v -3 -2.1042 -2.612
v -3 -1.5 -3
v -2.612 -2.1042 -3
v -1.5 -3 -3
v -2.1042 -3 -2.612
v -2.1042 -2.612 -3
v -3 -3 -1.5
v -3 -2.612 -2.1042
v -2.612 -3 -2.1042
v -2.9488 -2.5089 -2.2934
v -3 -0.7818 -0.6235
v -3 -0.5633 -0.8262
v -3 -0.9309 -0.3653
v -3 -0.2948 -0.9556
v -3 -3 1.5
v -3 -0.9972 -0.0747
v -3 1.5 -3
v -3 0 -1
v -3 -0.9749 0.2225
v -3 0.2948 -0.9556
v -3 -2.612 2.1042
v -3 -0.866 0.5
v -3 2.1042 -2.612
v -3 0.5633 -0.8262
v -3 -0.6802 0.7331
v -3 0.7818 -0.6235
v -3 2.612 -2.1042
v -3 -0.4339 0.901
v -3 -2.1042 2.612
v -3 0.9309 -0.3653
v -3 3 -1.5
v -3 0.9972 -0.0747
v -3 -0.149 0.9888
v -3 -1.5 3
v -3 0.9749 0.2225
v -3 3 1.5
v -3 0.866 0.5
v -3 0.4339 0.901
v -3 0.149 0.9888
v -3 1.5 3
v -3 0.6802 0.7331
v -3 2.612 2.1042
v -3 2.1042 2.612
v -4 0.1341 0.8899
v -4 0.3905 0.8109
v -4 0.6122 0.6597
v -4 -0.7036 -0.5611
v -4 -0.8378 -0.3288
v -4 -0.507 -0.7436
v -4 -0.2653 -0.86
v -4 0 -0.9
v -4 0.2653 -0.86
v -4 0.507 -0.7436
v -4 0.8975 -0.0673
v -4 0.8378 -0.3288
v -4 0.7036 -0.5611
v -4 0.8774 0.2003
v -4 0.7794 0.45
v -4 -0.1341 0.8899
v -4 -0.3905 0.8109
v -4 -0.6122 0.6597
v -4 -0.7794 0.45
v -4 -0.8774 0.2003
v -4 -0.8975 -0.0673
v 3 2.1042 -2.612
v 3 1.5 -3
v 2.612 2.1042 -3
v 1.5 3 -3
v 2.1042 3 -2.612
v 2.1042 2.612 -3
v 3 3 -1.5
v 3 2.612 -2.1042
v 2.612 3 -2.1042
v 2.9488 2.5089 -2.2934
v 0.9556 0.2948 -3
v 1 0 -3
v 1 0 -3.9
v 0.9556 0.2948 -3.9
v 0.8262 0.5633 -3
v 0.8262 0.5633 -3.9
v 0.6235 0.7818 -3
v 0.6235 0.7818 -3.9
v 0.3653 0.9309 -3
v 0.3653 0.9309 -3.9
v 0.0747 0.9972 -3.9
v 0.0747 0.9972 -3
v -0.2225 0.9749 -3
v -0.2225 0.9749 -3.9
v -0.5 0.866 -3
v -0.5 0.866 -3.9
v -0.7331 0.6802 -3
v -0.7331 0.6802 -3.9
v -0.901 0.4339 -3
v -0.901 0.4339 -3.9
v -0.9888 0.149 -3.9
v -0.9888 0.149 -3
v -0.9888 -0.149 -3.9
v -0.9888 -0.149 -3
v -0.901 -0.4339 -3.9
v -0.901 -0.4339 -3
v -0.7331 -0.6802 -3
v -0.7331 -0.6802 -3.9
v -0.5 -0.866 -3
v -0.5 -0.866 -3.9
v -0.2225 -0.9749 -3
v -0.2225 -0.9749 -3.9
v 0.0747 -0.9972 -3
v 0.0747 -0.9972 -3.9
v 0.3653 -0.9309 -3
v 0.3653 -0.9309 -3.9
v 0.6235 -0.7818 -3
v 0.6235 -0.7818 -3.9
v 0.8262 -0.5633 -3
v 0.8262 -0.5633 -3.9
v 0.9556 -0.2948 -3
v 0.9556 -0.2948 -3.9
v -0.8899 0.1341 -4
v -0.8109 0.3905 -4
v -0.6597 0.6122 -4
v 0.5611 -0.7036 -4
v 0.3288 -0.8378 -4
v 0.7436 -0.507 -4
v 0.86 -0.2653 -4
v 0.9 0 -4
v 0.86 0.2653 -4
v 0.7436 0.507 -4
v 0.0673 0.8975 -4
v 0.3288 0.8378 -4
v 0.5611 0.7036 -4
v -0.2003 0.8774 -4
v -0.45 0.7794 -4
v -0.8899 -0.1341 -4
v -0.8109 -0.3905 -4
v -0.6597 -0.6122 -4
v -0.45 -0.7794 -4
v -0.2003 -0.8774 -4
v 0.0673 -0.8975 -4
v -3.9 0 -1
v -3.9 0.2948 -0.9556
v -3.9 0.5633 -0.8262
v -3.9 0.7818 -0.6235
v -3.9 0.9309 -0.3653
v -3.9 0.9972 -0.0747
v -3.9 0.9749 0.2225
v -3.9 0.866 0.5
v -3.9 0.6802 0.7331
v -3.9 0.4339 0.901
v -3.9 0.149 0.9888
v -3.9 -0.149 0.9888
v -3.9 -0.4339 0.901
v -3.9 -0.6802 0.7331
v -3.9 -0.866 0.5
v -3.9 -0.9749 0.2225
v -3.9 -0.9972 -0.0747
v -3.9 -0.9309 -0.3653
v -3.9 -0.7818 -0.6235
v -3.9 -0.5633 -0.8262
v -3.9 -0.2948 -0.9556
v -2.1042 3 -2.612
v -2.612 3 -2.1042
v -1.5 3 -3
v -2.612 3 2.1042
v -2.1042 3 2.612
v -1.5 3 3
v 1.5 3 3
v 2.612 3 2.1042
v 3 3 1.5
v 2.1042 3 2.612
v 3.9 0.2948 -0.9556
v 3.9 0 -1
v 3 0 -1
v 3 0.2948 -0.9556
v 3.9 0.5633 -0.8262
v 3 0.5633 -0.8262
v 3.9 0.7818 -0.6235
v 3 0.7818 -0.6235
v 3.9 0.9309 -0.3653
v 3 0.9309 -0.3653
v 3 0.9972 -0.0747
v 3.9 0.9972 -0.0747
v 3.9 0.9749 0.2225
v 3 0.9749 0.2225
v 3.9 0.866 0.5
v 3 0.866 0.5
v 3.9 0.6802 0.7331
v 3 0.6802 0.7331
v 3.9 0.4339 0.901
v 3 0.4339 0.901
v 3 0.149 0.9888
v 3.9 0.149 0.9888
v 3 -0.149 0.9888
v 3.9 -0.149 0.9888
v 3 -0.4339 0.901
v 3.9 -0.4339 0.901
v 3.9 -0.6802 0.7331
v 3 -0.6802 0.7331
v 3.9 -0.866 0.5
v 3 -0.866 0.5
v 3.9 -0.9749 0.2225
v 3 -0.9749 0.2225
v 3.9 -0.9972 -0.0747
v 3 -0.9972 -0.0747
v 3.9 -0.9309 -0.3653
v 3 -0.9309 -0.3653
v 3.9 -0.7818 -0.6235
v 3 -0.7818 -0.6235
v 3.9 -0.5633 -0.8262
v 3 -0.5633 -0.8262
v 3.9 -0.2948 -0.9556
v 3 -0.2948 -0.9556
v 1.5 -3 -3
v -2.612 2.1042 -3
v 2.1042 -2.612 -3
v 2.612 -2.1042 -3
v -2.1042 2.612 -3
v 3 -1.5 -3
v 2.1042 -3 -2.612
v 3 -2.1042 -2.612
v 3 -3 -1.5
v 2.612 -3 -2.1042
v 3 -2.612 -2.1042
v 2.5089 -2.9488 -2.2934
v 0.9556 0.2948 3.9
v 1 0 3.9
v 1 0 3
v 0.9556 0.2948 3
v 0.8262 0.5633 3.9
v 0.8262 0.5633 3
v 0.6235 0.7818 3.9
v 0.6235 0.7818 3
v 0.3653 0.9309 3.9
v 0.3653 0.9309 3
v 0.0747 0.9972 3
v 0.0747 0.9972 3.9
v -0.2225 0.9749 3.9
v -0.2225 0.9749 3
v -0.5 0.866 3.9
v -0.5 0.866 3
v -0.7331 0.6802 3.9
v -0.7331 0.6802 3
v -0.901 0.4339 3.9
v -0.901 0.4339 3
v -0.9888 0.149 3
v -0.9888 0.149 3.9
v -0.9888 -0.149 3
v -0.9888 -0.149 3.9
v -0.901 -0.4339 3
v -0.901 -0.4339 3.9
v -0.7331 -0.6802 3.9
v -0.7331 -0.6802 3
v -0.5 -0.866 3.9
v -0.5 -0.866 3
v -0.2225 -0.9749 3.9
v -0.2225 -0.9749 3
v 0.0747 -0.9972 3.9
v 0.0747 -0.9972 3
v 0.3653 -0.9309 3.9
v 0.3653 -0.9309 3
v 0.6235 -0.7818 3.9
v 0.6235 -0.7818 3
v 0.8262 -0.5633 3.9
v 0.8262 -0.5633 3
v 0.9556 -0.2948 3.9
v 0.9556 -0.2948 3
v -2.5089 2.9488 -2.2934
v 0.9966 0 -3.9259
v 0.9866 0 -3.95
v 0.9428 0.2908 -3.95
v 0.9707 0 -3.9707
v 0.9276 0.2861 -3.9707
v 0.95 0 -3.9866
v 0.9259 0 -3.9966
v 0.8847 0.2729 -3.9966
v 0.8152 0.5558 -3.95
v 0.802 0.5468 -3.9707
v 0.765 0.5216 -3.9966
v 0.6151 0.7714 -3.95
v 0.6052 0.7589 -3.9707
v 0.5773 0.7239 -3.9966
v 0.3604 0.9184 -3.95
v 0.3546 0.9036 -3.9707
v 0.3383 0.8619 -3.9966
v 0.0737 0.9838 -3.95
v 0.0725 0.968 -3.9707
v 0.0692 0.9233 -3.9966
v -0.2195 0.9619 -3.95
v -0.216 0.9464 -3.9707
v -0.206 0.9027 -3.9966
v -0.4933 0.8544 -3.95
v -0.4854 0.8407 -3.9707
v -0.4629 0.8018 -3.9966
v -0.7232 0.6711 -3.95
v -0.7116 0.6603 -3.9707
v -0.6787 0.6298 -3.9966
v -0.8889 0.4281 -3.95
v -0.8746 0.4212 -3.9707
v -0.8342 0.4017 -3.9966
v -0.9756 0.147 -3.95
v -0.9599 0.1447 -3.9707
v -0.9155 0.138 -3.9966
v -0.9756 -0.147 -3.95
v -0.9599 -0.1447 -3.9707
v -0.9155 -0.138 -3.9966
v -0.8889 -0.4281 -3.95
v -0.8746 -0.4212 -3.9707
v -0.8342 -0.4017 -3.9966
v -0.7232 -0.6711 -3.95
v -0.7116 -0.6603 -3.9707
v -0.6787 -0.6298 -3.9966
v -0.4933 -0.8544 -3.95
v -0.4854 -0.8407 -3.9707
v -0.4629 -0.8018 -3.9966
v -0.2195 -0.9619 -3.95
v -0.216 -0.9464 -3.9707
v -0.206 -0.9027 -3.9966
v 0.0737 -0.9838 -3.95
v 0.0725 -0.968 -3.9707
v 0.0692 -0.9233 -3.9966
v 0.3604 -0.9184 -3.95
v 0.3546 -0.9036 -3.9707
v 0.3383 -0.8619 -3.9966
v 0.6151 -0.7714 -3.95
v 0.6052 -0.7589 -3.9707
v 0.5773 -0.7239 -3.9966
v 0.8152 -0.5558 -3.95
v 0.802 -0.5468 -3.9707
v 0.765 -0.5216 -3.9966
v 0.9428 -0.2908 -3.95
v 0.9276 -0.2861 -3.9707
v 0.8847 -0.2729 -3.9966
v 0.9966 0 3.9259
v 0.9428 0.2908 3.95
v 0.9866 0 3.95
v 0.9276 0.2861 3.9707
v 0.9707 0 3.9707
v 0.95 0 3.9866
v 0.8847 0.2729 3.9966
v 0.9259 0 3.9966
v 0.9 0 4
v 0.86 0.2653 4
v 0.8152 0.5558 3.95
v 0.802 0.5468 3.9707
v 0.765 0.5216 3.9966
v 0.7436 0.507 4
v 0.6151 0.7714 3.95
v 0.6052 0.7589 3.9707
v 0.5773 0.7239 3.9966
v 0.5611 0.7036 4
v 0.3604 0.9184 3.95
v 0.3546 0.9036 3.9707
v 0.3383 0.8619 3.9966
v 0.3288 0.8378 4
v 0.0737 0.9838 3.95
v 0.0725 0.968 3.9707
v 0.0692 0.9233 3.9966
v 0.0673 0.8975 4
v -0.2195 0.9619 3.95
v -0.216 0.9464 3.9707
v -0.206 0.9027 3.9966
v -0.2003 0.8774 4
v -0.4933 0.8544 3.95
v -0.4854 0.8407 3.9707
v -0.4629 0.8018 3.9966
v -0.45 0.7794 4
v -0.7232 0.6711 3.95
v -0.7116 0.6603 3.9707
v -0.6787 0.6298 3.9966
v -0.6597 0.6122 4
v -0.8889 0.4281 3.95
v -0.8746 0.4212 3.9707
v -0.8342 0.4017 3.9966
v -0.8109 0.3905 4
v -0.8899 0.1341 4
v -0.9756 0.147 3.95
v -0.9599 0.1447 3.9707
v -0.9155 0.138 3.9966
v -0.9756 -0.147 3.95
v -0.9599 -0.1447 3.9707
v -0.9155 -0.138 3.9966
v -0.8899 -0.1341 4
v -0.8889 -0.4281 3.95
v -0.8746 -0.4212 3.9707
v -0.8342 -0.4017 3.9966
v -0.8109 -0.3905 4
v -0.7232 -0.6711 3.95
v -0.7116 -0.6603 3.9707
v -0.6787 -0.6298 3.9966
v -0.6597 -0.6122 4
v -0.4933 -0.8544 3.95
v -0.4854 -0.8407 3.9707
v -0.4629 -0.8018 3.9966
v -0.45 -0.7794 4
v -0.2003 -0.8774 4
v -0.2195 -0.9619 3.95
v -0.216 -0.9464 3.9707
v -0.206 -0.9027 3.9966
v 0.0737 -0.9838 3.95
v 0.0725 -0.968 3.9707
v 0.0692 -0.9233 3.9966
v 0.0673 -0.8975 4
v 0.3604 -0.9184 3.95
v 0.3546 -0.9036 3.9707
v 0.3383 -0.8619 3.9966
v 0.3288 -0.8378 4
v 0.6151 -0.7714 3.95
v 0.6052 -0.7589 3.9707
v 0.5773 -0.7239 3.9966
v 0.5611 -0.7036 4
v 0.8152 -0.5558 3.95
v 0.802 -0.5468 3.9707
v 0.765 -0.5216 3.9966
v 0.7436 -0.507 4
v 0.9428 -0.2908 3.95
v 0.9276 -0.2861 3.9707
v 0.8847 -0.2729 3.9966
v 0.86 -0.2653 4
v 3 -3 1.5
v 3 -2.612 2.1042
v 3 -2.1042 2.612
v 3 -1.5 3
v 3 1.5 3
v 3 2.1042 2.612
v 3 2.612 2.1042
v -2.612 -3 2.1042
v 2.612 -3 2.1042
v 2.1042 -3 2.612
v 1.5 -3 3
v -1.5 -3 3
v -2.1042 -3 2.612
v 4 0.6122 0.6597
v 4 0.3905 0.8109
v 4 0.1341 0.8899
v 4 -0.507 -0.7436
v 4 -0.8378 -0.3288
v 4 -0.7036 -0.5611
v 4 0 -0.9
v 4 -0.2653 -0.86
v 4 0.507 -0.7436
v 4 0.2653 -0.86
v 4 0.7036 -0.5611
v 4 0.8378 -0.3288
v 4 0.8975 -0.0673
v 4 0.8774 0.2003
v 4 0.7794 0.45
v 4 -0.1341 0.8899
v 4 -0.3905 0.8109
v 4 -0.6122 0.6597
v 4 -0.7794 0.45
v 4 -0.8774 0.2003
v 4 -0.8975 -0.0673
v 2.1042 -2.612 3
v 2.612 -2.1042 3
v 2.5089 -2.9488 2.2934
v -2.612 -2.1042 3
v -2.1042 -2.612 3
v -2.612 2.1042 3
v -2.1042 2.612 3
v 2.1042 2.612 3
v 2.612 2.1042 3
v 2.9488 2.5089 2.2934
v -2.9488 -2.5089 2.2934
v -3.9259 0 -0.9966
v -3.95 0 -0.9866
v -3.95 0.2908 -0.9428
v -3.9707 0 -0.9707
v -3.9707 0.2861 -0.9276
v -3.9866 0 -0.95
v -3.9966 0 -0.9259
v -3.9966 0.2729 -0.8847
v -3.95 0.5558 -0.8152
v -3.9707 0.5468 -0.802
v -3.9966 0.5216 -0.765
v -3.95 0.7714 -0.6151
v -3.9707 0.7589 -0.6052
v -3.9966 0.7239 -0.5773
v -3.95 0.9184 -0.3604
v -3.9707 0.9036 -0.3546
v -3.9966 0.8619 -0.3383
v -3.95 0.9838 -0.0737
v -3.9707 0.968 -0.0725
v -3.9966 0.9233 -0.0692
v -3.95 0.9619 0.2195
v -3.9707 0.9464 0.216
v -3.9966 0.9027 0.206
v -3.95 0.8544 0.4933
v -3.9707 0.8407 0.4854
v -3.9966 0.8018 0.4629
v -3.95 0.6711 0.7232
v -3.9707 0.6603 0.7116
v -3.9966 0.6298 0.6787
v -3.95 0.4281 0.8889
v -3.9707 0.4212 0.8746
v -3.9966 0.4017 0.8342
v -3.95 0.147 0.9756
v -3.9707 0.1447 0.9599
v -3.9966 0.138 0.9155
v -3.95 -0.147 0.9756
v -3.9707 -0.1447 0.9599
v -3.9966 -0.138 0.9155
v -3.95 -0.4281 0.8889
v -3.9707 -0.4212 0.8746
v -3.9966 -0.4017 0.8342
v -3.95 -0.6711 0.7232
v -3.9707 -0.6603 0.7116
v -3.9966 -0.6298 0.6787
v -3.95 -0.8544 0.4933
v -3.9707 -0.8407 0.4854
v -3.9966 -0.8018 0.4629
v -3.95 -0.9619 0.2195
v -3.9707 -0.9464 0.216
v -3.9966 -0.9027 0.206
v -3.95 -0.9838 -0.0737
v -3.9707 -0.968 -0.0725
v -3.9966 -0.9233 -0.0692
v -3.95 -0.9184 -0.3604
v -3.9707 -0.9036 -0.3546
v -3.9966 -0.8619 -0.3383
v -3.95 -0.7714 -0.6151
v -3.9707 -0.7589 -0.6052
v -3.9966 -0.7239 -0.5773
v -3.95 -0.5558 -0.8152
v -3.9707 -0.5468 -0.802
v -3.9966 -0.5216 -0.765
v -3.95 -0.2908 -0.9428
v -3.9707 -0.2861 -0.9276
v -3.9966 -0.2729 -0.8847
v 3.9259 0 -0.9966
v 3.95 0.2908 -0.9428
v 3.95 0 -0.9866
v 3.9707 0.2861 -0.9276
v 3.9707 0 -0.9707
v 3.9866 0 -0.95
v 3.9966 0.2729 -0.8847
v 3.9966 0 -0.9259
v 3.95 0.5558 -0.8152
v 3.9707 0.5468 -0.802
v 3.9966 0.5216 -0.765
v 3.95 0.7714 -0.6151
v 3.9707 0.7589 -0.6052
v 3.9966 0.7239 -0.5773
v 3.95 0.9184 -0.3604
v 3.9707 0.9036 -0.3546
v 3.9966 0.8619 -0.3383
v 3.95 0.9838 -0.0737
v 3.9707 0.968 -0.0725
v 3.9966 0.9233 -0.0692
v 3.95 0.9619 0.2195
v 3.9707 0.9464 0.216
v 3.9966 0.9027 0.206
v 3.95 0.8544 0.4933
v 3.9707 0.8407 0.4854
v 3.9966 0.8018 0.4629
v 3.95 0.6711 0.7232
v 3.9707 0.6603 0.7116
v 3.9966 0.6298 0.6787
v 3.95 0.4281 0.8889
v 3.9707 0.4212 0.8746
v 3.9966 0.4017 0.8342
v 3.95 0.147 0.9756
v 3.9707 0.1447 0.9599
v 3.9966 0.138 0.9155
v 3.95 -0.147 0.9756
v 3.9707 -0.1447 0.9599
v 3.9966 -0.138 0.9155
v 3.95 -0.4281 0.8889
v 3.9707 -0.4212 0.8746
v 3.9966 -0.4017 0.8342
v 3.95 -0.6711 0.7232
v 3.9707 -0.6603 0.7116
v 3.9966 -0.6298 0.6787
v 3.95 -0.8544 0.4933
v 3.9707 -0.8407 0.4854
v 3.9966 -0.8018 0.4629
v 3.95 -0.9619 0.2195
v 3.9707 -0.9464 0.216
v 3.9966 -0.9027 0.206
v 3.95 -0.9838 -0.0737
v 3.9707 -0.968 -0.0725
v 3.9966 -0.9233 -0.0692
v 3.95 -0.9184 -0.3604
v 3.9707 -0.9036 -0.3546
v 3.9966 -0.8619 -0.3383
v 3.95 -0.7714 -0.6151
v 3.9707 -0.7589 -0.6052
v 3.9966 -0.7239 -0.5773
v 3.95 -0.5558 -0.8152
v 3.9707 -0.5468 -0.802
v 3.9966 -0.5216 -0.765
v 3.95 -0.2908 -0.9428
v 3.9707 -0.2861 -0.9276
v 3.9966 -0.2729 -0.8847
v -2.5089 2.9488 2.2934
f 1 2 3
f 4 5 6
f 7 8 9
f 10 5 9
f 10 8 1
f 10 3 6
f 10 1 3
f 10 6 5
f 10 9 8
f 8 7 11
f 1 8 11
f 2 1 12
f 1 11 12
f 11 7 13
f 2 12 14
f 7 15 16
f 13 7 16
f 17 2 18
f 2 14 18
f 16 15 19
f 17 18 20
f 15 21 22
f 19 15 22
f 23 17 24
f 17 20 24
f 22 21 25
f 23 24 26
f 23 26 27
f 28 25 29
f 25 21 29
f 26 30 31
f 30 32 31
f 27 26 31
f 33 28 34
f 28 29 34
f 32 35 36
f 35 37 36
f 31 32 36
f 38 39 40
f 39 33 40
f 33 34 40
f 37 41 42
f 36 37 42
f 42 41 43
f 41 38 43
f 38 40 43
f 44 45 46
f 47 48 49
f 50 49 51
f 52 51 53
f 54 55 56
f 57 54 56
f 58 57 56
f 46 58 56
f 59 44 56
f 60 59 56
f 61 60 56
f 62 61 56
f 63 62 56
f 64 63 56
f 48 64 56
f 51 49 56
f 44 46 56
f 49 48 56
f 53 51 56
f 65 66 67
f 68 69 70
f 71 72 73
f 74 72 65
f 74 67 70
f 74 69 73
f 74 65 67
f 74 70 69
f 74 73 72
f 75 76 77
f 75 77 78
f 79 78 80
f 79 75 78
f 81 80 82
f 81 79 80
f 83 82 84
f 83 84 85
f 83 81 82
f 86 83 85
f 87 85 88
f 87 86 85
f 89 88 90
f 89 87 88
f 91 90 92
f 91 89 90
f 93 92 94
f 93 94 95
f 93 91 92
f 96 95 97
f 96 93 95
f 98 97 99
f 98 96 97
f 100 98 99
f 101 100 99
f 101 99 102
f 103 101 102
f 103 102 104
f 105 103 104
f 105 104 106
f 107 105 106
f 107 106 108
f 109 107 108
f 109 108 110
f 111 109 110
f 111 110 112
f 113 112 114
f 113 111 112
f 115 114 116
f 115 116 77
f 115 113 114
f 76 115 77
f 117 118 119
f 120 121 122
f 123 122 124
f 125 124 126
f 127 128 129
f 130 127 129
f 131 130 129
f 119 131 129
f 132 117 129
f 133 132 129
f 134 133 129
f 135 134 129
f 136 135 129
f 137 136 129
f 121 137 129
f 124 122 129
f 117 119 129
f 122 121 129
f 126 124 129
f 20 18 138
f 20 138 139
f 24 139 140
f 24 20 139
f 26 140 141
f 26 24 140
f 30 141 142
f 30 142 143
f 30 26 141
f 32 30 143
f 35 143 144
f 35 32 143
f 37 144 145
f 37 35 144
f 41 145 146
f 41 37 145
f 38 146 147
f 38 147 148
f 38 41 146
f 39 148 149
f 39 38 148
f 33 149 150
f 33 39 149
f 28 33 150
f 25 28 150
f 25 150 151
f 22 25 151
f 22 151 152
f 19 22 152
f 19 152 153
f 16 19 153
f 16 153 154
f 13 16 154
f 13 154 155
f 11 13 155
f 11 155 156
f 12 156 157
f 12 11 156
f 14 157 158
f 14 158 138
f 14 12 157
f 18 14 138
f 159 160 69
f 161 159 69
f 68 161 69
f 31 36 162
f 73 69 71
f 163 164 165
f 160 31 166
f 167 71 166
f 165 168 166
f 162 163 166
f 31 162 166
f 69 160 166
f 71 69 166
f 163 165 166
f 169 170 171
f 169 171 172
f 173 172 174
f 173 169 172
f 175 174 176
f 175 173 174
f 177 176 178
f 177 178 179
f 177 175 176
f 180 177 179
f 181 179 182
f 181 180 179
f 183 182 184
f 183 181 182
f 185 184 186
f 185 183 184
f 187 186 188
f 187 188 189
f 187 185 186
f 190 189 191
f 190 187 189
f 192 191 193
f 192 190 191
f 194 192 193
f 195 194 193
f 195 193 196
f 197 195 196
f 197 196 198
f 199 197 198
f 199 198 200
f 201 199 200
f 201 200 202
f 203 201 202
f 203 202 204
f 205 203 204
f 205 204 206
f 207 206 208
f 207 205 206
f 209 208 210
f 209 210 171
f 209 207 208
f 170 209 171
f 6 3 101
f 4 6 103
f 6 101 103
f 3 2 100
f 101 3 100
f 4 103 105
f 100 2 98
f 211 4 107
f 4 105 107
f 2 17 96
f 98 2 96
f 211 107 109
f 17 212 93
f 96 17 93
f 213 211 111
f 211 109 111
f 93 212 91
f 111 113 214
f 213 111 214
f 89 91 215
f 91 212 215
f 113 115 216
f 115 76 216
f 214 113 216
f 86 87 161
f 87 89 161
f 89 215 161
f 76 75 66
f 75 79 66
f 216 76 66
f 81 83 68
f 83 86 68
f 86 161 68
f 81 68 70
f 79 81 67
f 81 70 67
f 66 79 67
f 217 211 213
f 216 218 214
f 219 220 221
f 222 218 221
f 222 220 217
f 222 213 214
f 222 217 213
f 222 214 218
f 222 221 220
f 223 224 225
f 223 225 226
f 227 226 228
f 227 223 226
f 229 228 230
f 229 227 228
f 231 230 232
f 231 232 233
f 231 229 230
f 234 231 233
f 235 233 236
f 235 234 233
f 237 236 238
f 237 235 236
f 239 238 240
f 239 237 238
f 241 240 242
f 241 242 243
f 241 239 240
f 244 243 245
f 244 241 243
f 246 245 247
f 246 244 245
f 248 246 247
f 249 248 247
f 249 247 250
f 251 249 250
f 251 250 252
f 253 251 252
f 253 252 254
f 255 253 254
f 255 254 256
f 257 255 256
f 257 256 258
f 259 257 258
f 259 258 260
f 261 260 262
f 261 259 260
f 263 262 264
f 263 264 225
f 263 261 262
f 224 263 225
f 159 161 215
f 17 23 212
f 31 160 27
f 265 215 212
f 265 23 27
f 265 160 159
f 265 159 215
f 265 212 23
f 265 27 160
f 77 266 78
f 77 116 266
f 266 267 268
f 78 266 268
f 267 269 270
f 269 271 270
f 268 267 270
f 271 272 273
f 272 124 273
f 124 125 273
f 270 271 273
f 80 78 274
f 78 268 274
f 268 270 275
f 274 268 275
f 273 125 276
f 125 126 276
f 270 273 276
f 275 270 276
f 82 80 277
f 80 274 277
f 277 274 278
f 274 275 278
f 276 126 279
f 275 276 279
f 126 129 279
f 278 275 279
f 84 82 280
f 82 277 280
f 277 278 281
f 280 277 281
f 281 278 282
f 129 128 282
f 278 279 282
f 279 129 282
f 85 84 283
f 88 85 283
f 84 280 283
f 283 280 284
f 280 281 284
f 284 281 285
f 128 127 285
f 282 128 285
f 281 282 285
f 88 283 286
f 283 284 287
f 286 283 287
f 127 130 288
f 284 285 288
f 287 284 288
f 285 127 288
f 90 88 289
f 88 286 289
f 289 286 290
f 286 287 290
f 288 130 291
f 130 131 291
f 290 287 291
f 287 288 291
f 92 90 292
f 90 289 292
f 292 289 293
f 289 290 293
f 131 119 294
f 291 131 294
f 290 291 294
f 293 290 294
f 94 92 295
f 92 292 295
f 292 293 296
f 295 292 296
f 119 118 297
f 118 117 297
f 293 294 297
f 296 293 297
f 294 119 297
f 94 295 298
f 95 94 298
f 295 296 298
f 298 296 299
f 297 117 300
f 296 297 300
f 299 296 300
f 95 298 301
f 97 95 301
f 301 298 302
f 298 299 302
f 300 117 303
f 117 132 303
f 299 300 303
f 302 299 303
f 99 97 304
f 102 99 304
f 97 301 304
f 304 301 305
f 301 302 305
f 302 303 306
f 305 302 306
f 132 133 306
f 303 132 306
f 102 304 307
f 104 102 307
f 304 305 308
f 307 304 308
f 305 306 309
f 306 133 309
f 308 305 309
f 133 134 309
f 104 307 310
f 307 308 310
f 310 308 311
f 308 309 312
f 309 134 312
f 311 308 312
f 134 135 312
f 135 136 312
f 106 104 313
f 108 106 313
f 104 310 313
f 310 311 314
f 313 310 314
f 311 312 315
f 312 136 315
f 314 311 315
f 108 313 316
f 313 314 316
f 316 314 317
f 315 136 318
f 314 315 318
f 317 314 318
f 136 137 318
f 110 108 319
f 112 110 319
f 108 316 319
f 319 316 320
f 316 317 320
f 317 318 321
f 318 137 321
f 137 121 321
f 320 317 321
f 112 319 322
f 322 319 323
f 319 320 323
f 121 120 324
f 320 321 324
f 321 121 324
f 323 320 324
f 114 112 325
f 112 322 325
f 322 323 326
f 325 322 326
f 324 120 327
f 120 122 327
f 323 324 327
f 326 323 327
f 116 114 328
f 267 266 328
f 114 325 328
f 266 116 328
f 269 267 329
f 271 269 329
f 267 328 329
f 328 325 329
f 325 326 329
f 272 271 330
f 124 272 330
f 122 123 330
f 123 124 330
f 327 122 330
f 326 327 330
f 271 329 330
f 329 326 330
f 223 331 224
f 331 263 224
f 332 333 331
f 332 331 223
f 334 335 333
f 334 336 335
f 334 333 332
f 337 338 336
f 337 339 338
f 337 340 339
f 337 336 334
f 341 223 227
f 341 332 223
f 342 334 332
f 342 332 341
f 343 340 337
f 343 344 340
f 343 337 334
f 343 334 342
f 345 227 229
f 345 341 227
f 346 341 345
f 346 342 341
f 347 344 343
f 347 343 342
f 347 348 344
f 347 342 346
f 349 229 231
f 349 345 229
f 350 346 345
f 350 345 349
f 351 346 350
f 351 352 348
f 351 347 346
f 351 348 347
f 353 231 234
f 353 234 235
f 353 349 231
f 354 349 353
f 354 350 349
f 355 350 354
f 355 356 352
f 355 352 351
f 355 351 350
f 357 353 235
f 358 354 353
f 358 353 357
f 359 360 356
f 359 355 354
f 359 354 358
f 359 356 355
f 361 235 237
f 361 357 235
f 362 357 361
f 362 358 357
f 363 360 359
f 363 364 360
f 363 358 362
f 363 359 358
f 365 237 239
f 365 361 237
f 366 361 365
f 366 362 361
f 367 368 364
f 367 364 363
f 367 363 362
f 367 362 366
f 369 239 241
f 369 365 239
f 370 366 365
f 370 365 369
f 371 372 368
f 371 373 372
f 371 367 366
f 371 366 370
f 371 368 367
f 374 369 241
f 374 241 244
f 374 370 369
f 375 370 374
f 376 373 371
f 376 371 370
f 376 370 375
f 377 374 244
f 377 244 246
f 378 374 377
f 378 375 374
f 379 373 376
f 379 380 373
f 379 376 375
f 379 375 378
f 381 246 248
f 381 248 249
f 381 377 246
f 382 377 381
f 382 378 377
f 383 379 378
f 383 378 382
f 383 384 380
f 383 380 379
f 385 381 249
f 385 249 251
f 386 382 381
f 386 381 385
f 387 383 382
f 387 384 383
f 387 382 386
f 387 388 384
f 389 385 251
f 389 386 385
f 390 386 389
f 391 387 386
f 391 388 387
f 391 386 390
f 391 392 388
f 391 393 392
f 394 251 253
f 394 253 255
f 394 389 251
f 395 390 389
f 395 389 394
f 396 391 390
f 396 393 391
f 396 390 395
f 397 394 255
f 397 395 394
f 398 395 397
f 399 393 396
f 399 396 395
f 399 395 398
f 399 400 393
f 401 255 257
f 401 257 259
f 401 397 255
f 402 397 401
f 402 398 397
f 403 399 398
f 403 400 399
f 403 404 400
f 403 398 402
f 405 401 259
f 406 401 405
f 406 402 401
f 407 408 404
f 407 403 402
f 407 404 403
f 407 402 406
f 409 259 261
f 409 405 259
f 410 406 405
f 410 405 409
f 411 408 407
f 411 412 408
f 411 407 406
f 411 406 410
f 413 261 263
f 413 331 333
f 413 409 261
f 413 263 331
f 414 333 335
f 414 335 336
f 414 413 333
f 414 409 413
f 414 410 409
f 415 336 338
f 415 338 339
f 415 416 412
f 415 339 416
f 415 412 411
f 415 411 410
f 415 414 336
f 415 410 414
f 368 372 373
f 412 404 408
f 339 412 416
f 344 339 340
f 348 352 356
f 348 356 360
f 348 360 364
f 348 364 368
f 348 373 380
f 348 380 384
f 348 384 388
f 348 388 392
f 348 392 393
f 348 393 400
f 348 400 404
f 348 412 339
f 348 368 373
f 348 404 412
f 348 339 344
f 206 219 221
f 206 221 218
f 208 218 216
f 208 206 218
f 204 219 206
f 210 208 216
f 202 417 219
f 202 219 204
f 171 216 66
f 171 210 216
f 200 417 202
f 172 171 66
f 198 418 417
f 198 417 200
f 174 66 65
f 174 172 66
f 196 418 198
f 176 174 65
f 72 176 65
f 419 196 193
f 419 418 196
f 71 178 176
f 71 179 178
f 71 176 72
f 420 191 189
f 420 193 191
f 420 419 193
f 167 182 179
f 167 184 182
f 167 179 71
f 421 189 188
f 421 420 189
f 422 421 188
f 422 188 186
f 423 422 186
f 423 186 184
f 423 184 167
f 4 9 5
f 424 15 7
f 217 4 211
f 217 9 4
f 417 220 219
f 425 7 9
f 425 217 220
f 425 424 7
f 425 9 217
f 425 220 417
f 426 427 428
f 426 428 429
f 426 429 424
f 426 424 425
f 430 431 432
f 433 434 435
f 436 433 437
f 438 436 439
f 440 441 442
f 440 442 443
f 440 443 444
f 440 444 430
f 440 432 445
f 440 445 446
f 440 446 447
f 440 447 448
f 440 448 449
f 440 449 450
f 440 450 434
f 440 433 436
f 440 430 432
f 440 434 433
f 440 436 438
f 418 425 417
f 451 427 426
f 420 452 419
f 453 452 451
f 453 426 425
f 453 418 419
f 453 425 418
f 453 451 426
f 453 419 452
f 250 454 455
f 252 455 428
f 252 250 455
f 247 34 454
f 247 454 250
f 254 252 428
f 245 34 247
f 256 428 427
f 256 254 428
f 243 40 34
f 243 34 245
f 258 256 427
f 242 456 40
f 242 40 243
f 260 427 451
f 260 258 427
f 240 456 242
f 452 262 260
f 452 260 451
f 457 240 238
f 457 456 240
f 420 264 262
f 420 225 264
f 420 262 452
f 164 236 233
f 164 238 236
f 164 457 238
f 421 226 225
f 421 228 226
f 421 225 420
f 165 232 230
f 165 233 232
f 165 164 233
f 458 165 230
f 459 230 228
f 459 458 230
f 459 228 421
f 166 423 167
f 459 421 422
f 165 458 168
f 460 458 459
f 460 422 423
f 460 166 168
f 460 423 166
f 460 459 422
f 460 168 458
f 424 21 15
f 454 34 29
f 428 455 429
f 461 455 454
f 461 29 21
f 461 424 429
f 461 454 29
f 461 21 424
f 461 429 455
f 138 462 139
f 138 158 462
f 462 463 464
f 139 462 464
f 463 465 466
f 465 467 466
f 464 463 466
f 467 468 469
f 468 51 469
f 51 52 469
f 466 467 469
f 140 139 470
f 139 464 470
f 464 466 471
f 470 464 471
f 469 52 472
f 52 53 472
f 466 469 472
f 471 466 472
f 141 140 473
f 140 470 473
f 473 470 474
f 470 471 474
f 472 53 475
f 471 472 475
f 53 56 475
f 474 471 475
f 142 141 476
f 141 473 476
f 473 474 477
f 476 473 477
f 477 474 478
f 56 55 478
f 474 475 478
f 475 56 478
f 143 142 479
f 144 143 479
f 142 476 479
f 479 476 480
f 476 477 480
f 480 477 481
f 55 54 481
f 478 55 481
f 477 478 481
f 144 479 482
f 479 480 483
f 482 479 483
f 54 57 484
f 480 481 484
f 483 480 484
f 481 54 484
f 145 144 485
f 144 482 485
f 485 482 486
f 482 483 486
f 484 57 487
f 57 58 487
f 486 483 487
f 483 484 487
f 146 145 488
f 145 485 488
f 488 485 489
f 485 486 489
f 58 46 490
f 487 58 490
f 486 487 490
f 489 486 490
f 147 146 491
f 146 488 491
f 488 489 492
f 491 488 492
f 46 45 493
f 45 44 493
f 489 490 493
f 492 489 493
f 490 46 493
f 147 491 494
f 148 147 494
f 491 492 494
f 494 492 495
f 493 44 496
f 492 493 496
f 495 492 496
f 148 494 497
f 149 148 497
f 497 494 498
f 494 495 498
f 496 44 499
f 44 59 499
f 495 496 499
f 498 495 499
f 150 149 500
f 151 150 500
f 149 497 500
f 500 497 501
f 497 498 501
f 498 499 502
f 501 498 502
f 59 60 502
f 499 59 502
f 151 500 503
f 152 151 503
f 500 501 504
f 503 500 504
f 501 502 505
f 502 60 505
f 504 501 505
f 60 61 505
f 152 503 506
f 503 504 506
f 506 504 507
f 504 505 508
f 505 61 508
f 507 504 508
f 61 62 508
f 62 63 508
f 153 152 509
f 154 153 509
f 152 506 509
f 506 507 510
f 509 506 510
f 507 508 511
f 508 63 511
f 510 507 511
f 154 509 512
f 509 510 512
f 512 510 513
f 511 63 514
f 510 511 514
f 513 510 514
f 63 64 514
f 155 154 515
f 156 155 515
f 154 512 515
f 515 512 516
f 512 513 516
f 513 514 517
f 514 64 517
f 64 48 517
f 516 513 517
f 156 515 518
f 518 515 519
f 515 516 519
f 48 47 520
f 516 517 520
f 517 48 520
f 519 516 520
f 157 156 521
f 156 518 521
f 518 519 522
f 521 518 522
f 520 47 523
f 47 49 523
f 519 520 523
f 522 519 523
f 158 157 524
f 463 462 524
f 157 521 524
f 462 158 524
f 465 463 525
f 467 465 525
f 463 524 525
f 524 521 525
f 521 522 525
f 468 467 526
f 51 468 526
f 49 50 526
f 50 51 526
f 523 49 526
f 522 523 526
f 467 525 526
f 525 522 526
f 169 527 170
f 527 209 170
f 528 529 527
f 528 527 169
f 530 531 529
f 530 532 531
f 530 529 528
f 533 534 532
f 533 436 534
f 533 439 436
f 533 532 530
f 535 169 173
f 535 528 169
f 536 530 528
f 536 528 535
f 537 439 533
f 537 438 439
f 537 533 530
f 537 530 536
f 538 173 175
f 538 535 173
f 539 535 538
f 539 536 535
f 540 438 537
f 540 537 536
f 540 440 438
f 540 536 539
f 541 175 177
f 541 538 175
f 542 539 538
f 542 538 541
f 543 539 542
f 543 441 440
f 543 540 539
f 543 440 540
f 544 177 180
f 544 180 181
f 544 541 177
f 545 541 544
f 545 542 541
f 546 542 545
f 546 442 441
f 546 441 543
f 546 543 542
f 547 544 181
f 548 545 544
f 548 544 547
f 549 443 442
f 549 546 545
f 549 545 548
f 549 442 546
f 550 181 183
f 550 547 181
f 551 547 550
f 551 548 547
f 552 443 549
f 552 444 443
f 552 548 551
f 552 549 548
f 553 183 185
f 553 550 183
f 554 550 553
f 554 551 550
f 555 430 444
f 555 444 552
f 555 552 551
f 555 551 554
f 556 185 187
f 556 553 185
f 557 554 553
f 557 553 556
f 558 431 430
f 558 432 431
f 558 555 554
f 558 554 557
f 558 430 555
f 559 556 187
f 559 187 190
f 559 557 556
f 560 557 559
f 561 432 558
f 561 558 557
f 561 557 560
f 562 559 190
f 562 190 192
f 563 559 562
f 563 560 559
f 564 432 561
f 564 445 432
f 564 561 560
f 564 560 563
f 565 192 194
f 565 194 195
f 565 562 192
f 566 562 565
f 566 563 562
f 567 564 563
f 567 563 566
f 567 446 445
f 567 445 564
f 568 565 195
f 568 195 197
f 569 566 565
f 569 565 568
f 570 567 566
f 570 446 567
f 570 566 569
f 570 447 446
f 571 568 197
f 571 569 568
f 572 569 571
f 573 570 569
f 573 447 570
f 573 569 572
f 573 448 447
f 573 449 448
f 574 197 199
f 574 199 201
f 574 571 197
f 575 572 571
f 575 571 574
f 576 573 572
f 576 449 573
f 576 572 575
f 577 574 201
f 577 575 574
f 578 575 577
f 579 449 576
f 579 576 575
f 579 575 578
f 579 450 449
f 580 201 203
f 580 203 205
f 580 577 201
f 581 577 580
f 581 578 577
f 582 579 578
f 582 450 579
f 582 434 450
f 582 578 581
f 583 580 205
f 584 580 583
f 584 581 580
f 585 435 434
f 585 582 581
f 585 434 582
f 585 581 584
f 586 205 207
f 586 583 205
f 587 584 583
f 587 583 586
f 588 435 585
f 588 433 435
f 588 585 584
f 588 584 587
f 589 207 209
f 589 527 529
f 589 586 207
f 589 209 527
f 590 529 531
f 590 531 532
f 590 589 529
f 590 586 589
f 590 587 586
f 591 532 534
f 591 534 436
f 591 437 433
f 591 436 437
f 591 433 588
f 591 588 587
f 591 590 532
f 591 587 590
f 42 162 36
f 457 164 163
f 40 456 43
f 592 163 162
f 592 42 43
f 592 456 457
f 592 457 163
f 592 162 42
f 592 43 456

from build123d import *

# Parameters (mm, degrees)
SKETCH_1_W      = 6
SKETCH_1_H      = 6
EXTRUDE_1_DEPTH = 3
SKETCH_2_R      = 1
EXTRUDE_2_DEPTH = 4
SKETCH_3_R      = 1
EXTRUDE_3_DEPTH = 4
FILLET_1_R      = 0.1


with BuildPart() as part:
    # 草图1 → 凸台-拉伸1 (new body, symmetric)
    with BuildSketch(Plane.XY):
        Rectangle(SKETCH_1_W, SKETCH_1_H)
    extrude(amount=EXTRUDE_1_DEPTH, both=True)

    # 草图4 → 切除-旋转4 (revolve, cut)
    with BuildSketch(Plane(origin=(0, 0, 0), x_dir=(1, 0, 0), z_dir=(0, 1, 0))):
        with BuildLine():
            Line((0, -4.5), (0, -6.318562405))
            Line((0, -6.318562405), (-7, -6.318562405))
            Line((-7, -6.318562405), (-7, 6.288804718))
            Line((-7, 6.288804718), (0, 6.288804718))
            Line((0, 6.288804718), (0, 4.5))
            ThreePointArc((0, 4.5), (-4.5, 0), (0, -4.5))
        make_face()
    revolve(axis=Axis((0, 0, -4.5), (0, 0, 1)), mode=Mode.SUBTRACT)

    # 草图2 → 凸台-拉伸2 (add, symmetric)
    with BuildSketch(Plane.XY):
        Circle(SKETCH_2_R)
    extrude(amount=EXTRUDE_2_DEPTH, both=True)

    # 草图3 → 凸台-拉伸3 (add, symmetric)
    with BuildSketch(Plane(origin=(0, 0, 0), x_dir=(0, 0, -1), z_dir=(1, 0, 0))):
        Circle(SKETCH_3_R)
    extrude(amount=EXTRUDE_3_DEPTH, both=True)

    # 圆角1
    fillet_1_edges = [part.edges().sort_by_distance(p)[0] for p in [
        (-1, 0, -4),
        (-1, 0, 4),
        (-4, 0, 1),
        (4, 0, 1),
    ]]
    fillet(fillet_1_edges, radius=FILLET_1_R)


solid = part.part
